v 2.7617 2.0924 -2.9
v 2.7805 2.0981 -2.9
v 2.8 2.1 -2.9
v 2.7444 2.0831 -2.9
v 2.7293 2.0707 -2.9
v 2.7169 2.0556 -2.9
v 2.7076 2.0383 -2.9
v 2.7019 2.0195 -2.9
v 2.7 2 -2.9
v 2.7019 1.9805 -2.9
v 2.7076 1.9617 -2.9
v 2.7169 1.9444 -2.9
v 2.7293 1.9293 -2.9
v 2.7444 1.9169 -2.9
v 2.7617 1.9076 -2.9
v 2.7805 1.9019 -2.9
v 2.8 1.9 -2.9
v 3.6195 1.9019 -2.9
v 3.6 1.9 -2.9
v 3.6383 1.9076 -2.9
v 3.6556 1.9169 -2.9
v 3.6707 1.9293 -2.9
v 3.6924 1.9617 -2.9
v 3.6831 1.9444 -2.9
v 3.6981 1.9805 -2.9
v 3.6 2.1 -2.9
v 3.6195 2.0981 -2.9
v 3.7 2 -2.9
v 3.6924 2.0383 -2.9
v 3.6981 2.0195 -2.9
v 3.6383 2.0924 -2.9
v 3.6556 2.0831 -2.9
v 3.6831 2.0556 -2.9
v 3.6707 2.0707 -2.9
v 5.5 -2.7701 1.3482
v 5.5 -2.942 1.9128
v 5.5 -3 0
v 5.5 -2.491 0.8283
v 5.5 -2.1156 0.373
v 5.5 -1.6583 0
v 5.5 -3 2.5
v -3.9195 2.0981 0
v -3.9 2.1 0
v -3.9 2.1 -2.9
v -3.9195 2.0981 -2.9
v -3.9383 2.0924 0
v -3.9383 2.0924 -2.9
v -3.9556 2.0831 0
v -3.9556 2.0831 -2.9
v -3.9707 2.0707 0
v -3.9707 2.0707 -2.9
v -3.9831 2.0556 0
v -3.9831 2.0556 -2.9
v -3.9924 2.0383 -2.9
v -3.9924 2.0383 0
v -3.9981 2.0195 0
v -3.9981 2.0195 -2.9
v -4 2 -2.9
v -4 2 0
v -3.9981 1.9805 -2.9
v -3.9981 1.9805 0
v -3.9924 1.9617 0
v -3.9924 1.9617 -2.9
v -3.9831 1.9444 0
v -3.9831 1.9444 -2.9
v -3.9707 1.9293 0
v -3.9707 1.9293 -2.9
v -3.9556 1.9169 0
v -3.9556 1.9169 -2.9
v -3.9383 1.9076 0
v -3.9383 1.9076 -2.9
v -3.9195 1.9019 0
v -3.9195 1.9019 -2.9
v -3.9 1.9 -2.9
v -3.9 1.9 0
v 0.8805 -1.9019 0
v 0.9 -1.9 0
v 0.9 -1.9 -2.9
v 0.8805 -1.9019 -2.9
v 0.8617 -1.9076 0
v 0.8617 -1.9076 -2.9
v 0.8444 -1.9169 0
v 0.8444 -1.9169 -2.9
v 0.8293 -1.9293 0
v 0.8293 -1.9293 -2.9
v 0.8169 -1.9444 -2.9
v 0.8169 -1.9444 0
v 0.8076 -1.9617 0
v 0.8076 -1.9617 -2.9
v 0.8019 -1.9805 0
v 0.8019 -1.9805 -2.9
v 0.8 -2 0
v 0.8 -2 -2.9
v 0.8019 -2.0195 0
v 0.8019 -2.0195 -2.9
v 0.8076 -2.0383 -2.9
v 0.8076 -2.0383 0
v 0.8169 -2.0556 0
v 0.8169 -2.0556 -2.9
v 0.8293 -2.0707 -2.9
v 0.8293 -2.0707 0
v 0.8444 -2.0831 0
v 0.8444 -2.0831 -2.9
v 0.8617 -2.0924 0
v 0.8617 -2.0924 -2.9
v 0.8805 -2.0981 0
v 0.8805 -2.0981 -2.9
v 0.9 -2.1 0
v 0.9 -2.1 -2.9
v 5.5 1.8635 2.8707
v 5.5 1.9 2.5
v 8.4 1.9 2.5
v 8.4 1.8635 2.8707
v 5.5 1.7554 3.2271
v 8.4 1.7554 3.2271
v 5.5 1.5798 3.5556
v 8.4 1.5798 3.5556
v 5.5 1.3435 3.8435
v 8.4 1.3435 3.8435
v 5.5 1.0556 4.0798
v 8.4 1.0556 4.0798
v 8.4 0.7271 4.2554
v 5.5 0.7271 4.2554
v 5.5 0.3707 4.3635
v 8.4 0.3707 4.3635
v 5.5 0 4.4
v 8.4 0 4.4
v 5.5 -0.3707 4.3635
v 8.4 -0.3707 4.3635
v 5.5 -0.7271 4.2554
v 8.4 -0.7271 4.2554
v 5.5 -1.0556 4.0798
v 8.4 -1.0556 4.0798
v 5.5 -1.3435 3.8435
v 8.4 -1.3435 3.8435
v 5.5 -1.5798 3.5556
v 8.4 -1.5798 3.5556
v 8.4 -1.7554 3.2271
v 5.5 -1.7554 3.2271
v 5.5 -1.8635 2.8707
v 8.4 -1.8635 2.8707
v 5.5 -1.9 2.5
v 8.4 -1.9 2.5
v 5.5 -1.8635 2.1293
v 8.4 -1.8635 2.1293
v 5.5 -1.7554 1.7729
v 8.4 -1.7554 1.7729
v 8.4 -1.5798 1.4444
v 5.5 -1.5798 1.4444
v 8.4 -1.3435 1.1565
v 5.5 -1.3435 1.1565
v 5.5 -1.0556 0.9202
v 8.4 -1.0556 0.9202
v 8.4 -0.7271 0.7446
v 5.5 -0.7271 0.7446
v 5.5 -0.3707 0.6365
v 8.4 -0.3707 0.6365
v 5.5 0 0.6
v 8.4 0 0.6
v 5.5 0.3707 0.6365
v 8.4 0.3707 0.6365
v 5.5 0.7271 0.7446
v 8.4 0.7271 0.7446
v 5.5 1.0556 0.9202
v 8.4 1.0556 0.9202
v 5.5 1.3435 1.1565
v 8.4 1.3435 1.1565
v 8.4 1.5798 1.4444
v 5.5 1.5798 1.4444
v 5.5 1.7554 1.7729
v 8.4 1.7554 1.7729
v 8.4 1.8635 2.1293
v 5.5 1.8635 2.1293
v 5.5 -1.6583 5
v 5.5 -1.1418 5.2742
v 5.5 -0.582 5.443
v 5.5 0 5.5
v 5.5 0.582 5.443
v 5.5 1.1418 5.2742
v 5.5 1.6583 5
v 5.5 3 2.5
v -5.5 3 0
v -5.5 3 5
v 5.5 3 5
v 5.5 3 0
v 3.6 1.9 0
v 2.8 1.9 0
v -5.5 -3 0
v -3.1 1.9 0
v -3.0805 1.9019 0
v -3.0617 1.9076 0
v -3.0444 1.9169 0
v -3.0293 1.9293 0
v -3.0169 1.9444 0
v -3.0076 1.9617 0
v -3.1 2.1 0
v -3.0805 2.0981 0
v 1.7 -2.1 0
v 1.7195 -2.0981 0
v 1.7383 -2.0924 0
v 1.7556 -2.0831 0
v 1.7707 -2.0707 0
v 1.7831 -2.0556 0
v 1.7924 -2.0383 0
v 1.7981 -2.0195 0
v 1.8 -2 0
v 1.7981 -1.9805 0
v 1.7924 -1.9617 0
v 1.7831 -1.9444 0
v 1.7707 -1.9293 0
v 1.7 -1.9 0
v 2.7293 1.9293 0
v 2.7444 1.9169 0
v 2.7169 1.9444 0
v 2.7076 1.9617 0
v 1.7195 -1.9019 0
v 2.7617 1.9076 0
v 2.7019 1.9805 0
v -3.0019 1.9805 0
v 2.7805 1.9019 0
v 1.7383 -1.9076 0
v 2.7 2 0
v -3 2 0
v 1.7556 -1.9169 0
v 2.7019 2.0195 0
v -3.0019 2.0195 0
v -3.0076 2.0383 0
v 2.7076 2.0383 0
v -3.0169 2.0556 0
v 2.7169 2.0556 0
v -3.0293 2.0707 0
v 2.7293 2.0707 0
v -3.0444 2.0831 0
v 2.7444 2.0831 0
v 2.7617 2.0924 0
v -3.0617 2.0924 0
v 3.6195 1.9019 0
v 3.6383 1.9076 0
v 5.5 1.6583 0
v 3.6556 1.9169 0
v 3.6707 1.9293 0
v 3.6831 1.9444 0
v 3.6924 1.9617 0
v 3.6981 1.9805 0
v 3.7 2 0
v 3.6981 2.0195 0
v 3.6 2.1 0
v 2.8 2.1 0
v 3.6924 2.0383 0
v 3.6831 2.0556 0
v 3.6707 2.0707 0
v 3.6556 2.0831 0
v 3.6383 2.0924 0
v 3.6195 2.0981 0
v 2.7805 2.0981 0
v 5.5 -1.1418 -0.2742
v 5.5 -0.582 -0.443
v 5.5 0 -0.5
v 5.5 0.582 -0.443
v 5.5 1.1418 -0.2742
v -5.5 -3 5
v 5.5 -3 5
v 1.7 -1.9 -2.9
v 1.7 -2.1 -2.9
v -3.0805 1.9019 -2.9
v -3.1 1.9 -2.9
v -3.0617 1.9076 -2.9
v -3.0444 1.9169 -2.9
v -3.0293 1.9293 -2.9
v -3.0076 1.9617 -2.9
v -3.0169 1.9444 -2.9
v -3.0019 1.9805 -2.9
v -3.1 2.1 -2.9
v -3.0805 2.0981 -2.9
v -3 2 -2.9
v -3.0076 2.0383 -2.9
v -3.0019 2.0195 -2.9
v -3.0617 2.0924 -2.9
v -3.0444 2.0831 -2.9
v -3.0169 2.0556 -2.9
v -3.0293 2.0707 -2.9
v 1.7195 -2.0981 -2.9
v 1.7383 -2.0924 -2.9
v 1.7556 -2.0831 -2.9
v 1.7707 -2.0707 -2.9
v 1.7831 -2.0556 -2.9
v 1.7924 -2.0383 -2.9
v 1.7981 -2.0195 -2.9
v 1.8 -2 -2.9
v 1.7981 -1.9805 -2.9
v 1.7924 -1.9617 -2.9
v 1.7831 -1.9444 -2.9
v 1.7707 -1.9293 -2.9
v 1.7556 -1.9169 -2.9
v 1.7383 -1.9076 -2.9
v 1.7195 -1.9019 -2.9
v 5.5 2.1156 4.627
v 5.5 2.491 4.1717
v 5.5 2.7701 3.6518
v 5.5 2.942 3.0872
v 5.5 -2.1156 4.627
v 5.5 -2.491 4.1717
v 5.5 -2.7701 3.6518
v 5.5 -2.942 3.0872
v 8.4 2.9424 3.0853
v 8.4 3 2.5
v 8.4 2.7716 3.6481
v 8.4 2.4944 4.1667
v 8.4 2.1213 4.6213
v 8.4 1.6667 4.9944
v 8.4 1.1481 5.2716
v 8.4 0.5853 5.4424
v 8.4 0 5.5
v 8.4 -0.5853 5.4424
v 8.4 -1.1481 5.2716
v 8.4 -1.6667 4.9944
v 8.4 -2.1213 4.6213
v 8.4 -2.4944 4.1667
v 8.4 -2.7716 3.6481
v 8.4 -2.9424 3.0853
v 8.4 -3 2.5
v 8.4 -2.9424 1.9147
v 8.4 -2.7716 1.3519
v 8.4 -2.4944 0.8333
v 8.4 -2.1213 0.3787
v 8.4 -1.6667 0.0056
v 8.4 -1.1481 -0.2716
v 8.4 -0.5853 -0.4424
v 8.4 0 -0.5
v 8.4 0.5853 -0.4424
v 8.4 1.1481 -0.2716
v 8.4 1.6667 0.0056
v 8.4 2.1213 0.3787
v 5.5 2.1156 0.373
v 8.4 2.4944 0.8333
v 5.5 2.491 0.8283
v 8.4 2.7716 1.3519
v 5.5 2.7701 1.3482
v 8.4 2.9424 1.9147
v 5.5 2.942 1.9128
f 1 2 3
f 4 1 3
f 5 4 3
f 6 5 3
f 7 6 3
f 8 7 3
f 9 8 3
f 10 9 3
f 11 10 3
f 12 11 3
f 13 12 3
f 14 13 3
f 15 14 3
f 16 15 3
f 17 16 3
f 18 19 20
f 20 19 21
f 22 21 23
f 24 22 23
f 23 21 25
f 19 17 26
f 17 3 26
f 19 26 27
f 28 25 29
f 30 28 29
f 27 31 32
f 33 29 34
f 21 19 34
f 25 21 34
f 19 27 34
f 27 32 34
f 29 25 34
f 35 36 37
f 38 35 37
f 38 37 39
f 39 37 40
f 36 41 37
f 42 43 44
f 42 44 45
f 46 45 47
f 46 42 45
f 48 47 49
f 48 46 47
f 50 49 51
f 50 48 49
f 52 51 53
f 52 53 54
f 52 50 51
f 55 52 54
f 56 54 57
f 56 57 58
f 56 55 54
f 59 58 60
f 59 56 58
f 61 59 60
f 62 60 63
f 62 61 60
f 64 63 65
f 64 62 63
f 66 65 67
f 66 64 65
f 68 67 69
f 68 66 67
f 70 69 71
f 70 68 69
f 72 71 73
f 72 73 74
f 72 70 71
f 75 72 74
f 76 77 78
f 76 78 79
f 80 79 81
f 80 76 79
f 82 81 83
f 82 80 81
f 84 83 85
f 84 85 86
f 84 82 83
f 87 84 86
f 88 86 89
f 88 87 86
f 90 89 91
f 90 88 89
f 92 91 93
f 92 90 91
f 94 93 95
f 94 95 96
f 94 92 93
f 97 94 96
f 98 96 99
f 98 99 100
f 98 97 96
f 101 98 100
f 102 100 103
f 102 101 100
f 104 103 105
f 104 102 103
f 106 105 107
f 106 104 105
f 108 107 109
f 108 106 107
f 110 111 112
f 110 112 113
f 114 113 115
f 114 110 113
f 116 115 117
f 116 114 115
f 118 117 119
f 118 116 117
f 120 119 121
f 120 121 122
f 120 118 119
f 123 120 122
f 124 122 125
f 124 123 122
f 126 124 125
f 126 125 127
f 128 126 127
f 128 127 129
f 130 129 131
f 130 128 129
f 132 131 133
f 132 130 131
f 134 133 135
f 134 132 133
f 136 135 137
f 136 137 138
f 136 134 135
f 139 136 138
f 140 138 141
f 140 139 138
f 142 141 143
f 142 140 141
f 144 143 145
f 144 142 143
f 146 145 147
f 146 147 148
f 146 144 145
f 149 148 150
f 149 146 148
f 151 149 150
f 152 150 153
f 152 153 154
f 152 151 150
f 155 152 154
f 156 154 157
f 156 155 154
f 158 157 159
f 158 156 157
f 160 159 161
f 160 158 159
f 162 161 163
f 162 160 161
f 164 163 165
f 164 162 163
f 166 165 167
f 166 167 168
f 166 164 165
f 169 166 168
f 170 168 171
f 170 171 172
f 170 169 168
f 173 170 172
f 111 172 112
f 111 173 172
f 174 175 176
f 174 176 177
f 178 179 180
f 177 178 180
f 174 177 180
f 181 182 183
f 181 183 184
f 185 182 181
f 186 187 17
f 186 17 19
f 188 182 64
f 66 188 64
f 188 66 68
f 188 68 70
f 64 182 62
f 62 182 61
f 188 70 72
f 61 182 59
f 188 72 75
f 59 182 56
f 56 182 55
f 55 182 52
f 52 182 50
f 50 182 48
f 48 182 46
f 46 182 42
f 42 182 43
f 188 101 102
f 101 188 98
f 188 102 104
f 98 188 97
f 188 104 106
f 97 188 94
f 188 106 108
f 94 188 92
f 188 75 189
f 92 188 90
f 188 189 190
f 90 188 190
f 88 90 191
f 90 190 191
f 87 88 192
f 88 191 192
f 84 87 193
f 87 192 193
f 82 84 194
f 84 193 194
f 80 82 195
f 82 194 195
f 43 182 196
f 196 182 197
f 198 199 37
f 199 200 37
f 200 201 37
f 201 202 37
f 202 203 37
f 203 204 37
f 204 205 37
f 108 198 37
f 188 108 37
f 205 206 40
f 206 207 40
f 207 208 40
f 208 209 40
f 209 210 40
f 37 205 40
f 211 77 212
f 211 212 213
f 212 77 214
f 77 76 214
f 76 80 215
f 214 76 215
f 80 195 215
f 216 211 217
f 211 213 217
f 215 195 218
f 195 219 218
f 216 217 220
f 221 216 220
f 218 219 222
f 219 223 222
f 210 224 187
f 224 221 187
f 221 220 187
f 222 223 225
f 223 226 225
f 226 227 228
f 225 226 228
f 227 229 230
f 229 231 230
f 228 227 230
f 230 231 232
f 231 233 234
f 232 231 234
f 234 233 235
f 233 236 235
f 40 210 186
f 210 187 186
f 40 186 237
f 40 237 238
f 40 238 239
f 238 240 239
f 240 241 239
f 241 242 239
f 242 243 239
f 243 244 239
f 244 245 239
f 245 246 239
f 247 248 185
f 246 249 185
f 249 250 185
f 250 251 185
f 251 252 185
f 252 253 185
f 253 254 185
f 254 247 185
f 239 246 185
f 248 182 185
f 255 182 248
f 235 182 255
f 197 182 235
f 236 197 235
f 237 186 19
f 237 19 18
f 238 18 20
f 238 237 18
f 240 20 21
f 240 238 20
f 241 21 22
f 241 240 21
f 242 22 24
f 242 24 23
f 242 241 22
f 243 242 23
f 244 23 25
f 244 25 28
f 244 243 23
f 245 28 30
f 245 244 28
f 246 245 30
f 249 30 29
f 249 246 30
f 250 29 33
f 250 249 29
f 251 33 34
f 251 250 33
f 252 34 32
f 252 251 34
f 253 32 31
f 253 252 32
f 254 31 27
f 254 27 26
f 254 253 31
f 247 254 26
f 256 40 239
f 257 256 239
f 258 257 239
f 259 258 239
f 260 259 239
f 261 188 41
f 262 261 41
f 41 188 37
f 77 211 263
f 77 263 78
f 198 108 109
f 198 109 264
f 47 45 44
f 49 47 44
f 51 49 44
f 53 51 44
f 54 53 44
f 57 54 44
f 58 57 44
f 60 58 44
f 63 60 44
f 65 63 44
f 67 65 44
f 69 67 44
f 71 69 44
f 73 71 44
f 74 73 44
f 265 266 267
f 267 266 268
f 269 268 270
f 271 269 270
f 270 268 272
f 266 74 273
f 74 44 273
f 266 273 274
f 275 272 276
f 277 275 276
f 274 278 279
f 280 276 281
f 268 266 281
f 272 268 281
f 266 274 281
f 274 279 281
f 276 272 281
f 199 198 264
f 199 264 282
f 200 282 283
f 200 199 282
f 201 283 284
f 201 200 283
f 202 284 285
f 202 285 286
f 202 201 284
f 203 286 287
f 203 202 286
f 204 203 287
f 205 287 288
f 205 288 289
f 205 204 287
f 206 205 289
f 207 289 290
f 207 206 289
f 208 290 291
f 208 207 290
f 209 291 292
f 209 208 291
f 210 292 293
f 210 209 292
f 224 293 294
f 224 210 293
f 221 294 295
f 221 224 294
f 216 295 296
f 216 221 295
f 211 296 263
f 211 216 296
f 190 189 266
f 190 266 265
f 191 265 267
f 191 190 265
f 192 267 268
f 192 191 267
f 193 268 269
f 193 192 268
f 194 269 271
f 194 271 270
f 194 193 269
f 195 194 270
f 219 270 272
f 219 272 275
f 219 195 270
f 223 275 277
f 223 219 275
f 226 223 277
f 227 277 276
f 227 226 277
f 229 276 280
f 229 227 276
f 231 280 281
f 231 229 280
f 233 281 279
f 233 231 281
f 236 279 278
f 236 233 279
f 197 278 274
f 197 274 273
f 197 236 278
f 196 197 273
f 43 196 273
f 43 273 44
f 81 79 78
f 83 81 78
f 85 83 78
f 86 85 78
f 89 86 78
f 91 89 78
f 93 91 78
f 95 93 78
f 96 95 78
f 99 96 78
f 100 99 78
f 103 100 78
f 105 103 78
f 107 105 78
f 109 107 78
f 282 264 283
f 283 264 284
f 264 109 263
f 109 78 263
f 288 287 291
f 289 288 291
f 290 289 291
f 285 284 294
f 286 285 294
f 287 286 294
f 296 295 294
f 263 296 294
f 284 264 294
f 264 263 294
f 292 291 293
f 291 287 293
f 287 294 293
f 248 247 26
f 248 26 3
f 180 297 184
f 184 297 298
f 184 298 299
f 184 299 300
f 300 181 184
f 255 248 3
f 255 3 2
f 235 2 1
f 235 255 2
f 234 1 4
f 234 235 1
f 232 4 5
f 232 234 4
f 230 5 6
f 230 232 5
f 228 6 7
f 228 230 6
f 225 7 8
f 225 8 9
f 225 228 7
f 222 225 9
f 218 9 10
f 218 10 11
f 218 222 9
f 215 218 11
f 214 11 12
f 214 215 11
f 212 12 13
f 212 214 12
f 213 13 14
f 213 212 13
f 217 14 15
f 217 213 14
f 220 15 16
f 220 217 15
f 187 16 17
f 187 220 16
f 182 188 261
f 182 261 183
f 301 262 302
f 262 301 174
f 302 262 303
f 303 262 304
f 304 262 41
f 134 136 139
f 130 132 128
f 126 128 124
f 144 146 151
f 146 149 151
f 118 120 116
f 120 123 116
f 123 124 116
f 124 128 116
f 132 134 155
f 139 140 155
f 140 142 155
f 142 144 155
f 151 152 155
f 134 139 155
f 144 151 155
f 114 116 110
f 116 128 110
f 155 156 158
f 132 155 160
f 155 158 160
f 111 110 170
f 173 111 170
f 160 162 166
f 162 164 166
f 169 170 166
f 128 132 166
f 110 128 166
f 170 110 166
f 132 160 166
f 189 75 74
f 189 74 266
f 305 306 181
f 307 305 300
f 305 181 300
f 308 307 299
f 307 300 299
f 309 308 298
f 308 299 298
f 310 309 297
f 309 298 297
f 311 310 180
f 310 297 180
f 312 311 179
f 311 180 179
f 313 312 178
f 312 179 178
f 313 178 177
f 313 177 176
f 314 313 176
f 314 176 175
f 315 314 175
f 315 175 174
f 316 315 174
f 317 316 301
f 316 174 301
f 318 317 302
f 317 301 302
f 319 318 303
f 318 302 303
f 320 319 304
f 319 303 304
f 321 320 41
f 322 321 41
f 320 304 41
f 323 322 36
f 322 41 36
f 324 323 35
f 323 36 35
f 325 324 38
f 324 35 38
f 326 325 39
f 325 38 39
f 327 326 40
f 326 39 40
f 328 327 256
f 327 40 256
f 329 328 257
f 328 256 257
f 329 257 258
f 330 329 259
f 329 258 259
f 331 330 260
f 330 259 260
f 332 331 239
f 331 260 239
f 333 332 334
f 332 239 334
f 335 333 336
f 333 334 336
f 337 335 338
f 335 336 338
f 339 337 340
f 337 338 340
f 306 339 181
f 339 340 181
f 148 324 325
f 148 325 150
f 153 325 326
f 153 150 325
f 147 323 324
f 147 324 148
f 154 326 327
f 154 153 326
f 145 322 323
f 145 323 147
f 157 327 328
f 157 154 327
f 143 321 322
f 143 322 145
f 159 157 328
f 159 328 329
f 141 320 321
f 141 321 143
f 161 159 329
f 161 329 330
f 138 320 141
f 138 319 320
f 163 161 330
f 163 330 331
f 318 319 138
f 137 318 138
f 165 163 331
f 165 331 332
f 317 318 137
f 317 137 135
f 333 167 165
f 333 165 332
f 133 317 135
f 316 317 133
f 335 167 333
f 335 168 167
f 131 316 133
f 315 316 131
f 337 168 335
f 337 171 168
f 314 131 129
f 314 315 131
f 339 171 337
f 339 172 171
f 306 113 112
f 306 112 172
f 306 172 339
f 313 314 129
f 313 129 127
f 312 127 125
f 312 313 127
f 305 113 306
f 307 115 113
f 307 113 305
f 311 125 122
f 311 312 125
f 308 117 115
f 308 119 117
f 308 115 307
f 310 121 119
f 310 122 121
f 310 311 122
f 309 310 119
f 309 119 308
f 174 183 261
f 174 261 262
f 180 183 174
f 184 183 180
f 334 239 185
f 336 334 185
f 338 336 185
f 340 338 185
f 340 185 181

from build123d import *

# Parameters (mm, degrees)
SKETCH1_W           = 11
SKETCH1_H           = 6
BOSS_EXTRUDE1_DEPTH = 5
SKETCH2_R           = 3
SKETCH2_R_2         = 1.9
BOSS_EXTRUDE2_DEPTH = 2.9
BOSS_EXTRUDE3_DEPTH = 2.9


with BuildPart() as part:
    # Sketch1 → Boss-Extrude1 (new body)
    with BuildSketch(Plane.XY):
        Rectangle(SKETCH1_W, SKETCH1_H)
    extrude(amount=BOSS_EXTRUDE1_DEPTH)

    # Sketch2 → Boss-Extrude2 (add)
    with BuildSketch(Plane(origin=(5.5, 0, 0), x_dir=(0, 0, -1), z_dir=(1, 0, 0))):
        with Locations(Location((-2.5, 0, 0), (0, 0, 90))):
            Circle(SKETCH2_R)
        with Locations(Location((-2.5, 0, 0), (0, 0, 90))):
            Circle(SKETCH2_R_2, mode=Mode.SUBTRACT)
    extrude(amount=BOSS_EXTRUDE2_DEPTH)

    # Sketch3 → Boss-Extrude3 (add)
    with BuildSketch(Plane(origin=(0, 0, 0), x_dir=(-1, 0, 0), z_dir=(0, 0, -1))):
        with BuildLine():
            Line((-3.6, 2.1), (-2.8, 2.1))
            ThreePointArc((-2.8, 2.1), (-2.7, 2), (-2.8, 1.9))
            Line((-2.8, 1.9), (-3.6, 1.9))
            ThreePointArc((-3.6, 1.9), (-3.7, 2), (-3.6, 2.1))
        make_face()
        with BuildLine():
            Line((3.9, 1.9), (3.1, 1.9))
            ThreePointArc((3.1, 1.9), (3, 2), (3.1, 2.1))
            Line((3.1, 2.1), (3.9, 2.1))
            ThreePointArc((3.9, 2.1), (4, 2), (3.9, 1.9))
        make_face()
        with BuildLine():
            Line((-1.7, -1.9), (-0.9, -1.9))
            ThreePointArc((-0.9, -1.9), (-0.8, -2), (-0.9, -2.1))
            Line((-0.9, -2.1), (-1.7, -2.1))
            ThreePointArc((-1.7, -2.1), (-1.8, -2), (-1.7, -1.9))
        make_face()
    extrude(amount=BOSS_EXTRUDE3_DEPTH)


solid = part.part
